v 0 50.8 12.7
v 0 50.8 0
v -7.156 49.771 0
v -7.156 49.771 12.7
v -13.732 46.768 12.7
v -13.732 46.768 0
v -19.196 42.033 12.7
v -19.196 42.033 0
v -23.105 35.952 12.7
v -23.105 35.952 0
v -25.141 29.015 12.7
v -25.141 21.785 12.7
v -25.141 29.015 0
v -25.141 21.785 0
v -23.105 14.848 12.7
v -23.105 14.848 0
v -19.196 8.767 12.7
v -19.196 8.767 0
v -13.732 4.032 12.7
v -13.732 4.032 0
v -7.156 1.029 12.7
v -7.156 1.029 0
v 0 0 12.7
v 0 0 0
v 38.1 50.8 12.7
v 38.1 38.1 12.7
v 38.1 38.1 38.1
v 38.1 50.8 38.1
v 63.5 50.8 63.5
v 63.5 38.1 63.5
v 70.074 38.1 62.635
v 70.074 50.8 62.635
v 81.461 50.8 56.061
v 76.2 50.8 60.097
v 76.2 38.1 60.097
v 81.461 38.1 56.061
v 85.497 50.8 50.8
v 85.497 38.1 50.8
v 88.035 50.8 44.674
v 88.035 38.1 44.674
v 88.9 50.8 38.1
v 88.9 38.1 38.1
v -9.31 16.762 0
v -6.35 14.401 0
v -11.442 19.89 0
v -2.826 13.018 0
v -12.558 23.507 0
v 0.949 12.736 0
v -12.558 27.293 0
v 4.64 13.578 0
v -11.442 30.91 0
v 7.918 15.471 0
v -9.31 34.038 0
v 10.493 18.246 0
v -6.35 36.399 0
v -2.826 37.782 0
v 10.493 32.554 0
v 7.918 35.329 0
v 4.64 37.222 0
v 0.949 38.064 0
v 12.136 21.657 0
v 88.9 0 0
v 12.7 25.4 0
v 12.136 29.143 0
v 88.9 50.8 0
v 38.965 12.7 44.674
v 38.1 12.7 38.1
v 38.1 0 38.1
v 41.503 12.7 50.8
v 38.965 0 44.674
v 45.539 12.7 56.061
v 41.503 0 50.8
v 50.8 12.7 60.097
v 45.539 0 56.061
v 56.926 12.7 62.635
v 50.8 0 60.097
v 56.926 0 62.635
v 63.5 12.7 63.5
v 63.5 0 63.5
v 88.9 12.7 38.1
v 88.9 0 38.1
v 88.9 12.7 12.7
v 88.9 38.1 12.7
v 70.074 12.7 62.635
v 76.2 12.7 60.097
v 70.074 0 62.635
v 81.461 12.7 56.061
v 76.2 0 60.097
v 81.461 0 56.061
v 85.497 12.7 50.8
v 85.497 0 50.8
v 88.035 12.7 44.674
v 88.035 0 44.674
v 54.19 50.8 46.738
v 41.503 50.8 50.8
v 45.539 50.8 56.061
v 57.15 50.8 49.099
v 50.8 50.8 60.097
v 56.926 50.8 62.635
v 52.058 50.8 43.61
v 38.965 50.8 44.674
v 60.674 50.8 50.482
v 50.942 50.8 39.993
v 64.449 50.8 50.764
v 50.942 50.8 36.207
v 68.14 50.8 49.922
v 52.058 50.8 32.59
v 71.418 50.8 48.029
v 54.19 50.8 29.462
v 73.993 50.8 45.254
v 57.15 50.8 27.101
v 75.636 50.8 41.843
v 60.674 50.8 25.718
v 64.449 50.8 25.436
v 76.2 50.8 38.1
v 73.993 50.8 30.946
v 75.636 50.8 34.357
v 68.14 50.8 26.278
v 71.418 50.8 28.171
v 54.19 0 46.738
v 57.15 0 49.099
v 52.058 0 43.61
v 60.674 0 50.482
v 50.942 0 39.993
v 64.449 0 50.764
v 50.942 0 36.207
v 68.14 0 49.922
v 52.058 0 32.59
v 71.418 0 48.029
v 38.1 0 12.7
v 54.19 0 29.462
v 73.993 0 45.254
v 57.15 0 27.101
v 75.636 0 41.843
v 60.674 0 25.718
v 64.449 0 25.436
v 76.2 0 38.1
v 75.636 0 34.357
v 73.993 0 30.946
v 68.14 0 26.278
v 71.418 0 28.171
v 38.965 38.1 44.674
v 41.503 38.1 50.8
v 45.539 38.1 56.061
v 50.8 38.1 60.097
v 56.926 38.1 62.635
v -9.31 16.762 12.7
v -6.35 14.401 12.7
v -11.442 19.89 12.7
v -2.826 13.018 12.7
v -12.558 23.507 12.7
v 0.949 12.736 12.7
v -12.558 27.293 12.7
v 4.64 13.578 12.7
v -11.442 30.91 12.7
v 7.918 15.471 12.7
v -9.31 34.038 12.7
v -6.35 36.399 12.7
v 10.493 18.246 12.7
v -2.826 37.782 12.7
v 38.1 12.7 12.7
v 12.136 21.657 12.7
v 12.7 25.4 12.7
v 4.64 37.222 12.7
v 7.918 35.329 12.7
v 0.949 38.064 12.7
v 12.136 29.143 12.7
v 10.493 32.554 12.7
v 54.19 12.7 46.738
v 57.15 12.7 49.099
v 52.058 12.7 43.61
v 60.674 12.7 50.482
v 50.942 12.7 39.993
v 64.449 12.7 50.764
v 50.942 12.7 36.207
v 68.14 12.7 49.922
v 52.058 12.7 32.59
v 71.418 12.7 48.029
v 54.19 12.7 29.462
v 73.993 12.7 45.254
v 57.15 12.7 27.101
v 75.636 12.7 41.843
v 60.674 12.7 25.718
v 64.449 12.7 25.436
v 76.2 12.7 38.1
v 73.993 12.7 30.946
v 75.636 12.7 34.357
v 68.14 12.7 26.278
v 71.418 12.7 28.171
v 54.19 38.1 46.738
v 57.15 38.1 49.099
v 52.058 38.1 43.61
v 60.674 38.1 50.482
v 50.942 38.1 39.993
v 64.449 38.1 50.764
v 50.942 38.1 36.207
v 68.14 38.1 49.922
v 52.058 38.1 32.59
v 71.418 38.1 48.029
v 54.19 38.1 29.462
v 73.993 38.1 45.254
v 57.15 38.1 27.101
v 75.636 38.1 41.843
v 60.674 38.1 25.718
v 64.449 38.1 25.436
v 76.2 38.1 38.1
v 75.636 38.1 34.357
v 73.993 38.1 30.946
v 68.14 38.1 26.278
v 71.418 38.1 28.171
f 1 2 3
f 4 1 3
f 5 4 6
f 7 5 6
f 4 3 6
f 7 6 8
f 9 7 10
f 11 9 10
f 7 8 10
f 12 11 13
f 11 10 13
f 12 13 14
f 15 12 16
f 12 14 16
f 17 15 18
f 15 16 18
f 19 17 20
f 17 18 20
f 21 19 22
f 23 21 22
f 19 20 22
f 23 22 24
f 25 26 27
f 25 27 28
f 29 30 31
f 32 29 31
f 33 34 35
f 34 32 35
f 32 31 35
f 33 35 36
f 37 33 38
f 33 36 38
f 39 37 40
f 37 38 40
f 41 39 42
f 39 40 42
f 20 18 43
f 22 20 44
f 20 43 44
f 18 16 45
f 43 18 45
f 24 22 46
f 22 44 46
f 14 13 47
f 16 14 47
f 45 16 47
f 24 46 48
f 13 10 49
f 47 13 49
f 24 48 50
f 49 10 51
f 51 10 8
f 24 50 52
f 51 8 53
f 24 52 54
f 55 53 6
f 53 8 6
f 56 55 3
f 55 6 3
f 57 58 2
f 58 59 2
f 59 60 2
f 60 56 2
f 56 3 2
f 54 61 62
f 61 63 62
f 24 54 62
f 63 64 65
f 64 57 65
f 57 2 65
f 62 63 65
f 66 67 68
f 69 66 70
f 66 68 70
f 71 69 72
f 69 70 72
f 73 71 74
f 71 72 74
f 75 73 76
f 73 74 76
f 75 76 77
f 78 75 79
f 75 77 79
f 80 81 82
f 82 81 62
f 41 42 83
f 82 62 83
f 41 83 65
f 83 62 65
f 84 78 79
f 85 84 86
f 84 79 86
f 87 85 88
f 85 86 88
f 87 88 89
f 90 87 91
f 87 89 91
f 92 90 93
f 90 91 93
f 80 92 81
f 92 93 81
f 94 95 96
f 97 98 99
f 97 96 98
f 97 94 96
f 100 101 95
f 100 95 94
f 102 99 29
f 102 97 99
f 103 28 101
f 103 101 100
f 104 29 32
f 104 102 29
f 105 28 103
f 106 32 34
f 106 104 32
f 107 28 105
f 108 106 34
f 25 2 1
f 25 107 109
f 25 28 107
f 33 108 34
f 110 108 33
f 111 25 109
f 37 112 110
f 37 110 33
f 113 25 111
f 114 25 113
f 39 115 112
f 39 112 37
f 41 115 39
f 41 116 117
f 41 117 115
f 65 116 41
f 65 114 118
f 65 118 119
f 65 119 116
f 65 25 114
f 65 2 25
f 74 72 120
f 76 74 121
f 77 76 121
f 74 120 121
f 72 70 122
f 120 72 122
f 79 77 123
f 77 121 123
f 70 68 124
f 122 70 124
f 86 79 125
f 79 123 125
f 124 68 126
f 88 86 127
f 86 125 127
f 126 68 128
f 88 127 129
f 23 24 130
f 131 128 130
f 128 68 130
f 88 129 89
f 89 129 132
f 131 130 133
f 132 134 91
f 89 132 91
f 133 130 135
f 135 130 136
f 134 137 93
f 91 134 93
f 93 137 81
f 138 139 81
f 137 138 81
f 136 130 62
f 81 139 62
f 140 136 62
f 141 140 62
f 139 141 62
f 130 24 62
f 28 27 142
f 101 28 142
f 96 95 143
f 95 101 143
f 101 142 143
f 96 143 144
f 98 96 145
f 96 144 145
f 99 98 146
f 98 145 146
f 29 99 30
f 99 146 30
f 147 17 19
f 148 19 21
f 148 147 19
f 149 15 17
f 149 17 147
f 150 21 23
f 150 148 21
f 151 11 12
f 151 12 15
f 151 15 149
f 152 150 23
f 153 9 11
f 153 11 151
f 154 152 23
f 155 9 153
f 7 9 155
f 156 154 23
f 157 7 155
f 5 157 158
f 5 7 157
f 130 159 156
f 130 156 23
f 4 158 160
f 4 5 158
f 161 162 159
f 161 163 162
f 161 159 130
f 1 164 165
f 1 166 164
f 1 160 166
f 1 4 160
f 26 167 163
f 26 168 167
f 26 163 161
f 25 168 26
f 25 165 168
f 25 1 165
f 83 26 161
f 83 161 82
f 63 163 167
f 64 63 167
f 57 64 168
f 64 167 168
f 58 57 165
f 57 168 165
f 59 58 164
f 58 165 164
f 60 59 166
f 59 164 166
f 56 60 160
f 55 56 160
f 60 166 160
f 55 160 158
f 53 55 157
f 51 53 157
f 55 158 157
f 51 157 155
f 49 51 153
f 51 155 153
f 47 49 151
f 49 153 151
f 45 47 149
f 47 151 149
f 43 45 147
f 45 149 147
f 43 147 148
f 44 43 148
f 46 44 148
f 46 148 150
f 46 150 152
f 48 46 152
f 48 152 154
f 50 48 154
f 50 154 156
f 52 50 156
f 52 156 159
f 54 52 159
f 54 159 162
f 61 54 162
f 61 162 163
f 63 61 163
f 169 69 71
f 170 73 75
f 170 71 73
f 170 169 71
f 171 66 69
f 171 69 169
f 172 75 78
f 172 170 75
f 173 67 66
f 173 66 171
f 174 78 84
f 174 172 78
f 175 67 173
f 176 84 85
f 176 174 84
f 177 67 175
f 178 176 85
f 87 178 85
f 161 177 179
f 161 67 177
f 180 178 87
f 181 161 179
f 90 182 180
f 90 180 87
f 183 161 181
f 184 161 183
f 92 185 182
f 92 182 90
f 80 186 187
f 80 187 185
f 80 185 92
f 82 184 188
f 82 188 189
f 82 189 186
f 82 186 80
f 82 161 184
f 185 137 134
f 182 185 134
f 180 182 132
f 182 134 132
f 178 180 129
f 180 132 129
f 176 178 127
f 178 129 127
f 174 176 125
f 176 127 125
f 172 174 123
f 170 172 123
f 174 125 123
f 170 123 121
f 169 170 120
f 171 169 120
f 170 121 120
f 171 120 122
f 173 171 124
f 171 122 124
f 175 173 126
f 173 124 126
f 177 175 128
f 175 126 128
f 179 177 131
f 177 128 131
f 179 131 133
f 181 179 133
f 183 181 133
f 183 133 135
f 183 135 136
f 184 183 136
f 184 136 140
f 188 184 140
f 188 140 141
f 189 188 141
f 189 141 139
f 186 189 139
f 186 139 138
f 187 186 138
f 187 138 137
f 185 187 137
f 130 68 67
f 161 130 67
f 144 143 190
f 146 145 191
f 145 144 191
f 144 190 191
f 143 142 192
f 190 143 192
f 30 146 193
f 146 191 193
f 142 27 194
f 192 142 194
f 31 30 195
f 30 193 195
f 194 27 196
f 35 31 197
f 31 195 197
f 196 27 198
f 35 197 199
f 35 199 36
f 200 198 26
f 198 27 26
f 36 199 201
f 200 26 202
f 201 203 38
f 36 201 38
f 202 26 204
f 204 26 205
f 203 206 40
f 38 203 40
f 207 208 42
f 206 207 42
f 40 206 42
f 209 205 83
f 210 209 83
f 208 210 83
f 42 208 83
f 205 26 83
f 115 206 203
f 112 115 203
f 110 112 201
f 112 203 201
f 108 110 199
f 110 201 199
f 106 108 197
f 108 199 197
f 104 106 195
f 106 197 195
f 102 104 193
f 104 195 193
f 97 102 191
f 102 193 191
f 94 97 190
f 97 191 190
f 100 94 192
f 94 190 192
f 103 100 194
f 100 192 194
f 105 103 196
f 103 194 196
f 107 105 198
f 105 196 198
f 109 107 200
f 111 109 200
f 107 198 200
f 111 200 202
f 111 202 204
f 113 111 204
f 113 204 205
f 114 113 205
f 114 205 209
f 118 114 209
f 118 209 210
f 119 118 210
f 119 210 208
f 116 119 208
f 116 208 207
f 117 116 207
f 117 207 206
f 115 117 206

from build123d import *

# Parameters (mm, degrees)
F1_DEPTH = 12.7
F2_R     = 12.7
F3_DEPTH = 12.701
F4_W     = 50.8
F4_H     = 12.7
F5_DEPTH = 50.8
F6_R     = 12.7
F7_DEPTH = 50.801


with BuildPart() as f1:
    # F0 (on Top) → F1 (new body)
    with BuildSketch(Plane.XY):
        with BuildLine():
            ThreePointArc((25.4, 25.4), (17.960512, 7.439488), (0, 0))
            Line((0, 0), (88.9, 0))
            Line((88.9, 0), (88.9, 50.8))
            Line((88.9, 50.8), (0, 50.8))
            ThreePointArc((0, 50.8), (17.960512, 43.360512), (25.4, 25.4))
        make_face()
        with BuildLine():
            Line((0, 50.8), (0, 0))
            ThreePointArc((0, 0), (17.960512, 7.439488), (25.4, 25.4))
            ThreePointArc((25.4, 25.4), (17.960512, 43.360512), (0, 50.8))
        make_face()
        with BuildLine():
            ThreePointArc((0, 50.8), (-25.4, 25.4), (0, 0))
            Line((0, 0), (0, 50.8))
        make_face()
    extrude(amount=F1_DEPTH)

    # F2 (on face) → F3 (cut, through all)
    with BuildSketch(Plane.XY.offset(12.7)):
        with Locations((0, 25.4)):
            Circle(F2_R)
    extrude(amount=-F3_DEPTH, mode=Mode.SUBTRACT)

    # F4 (on face) → F5 (join)
    with BuildSketch(Plane.XY.offset(12.7)):
        with Locations((63.5, 44.45)):
            Rectangle(F4_W, F4_H)
        with Locations((63.5, 6.35)):
            Rectangle(F4_W, F4_H)
    extrude(amount=F5_DEPTH)

    # F6 (on face) → F7 (cut, through all)
    with BuildSketch(Plane.XZ):
        with BuildLine():
            ThreePointArc((63.5, 63.5), (81.460512, 56.060512), (88.9, 38.1))
            Line((88.9, 38.1), (88.9, 63.5))
            Line((88.9, 63.5), (63.5, 63.5))
        make_face()
        with BuildLine():
            ThreePointArc((38.1, 38.1), (45.539488, 56.060512), (63.5, 63.5))
            Line((63.5, 63.5), (38.1, 63.5))
            Line((38.1, 63.5), (38.1, 38.1))
        make_face()
        with Locations((63.5, 38.1)):
            Circle(F6_R)
    extrude(amount=-F7_DEPTH, mode=Mode.SUBTRACT)


solid = f1.part
